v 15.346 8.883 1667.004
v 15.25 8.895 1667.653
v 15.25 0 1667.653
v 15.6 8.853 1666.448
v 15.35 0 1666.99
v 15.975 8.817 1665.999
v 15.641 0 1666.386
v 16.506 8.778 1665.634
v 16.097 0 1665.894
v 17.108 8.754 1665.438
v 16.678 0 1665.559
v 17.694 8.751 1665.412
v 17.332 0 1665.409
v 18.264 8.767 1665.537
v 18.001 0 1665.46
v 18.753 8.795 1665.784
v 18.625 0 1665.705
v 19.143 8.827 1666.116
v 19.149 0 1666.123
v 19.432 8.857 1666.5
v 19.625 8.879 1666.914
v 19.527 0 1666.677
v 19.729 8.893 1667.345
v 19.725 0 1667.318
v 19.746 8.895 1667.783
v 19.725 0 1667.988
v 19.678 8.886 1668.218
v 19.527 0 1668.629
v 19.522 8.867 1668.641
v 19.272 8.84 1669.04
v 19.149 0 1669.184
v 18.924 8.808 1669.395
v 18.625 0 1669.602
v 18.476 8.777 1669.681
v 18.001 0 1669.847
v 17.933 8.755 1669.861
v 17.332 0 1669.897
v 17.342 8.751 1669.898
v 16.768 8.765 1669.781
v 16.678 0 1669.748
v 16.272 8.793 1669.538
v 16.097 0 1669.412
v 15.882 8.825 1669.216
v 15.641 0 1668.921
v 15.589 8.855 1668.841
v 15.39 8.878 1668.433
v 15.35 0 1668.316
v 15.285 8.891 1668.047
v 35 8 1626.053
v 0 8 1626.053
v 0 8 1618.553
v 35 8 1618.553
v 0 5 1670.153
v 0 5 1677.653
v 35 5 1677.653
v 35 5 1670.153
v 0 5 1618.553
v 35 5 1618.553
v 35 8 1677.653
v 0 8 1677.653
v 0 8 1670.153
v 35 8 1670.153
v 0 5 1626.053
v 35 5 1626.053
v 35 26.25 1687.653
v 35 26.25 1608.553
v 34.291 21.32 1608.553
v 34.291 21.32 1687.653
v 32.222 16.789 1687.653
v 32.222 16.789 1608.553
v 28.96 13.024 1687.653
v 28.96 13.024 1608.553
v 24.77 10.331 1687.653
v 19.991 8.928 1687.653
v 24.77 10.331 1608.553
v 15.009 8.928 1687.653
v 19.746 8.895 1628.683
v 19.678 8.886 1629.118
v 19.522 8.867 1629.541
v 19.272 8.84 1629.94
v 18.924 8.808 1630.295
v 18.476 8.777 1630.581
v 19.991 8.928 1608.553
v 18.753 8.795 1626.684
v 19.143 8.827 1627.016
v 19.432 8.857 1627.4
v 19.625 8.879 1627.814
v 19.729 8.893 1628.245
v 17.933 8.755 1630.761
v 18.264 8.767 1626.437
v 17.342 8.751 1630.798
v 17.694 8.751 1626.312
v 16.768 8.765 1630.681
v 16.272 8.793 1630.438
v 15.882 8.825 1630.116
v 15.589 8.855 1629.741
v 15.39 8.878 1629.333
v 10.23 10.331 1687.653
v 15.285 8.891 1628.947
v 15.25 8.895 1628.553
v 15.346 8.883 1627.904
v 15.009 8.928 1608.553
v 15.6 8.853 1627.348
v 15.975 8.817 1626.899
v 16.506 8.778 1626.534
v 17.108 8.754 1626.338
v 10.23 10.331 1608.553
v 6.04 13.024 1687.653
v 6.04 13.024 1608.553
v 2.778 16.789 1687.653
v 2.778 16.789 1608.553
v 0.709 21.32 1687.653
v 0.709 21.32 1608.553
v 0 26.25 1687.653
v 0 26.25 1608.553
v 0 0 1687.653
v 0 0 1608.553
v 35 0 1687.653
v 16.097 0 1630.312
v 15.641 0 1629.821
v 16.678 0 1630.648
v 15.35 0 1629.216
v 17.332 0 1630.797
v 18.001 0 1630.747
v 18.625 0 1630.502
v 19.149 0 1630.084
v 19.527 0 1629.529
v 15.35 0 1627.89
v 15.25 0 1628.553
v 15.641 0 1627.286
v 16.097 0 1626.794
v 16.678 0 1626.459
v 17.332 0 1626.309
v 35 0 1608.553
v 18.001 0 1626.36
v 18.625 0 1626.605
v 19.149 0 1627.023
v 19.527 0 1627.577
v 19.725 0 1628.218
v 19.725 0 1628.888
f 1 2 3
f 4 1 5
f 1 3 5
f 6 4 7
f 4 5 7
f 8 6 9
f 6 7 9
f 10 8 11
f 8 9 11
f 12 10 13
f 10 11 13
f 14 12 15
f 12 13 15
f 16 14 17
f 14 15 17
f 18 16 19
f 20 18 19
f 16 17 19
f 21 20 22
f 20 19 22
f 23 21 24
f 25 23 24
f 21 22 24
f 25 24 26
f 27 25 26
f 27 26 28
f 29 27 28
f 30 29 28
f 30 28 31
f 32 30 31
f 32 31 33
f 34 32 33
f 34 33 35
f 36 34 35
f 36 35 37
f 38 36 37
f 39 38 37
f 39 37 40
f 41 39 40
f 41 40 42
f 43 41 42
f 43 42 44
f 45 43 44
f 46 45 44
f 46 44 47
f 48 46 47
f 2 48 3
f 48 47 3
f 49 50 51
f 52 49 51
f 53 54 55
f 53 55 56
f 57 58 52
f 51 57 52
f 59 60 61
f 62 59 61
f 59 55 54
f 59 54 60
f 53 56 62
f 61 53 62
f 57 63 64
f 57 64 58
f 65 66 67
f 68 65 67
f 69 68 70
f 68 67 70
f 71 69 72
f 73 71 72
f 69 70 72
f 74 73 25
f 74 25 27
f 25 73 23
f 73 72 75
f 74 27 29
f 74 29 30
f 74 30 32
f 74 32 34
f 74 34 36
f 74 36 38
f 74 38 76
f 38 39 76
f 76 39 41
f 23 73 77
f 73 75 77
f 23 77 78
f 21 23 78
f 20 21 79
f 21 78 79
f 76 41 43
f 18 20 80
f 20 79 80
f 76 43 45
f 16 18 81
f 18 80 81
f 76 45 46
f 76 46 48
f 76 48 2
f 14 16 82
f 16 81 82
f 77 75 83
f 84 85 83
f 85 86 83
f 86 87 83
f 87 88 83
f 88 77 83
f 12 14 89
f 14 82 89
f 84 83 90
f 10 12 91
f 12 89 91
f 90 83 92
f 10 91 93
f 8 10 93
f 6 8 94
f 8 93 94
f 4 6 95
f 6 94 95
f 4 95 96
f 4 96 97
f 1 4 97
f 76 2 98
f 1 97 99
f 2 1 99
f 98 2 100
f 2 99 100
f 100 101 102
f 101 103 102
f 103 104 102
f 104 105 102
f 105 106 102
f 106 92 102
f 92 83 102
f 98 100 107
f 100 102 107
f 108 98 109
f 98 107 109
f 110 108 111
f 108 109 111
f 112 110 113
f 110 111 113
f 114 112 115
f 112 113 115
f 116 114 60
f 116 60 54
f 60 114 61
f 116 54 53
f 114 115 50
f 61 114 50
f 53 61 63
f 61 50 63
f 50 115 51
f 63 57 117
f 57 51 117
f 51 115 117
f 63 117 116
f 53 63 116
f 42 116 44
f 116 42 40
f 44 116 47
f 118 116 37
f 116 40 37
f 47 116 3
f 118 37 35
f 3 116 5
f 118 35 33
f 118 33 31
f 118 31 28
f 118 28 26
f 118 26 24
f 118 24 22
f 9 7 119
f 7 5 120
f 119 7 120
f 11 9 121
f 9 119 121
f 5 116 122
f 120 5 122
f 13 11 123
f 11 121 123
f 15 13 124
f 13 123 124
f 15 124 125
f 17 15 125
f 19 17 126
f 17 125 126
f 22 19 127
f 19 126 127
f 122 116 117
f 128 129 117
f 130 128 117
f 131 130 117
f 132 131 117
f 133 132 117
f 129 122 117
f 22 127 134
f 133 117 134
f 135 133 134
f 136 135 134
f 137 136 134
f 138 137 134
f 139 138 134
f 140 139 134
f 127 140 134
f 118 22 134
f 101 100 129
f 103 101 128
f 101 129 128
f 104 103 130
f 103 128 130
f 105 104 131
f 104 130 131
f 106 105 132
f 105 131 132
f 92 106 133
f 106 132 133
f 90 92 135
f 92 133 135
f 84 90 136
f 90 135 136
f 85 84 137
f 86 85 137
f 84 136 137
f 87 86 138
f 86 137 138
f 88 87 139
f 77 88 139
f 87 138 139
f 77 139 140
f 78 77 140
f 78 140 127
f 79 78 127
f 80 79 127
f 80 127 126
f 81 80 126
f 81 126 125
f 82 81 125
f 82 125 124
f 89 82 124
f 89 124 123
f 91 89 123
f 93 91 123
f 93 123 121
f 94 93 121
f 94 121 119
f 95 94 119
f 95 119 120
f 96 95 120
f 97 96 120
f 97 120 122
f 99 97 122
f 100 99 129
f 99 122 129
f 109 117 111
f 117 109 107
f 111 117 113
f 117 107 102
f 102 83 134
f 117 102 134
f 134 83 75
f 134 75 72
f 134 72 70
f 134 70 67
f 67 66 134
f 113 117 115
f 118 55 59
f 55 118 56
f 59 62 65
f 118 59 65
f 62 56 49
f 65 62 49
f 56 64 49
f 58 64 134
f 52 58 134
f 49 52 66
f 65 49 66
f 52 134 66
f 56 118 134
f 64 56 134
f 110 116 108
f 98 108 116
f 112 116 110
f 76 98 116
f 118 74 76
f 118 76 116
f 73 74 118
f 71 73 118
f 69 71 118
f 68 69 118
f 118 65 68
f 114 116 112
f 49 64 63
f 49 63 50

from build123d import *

# Parameters (mm, degrees)
BOSS_EXTRU_1_DEPTH      = 79.1
D_GAGEMENT_M41_D        = 4.5
D_GAGEMENT_M41_DEPTH    = 10
D_GAGEMENT_M41_TIP      = 1.351936393
ESQUISSE7_W             = 7.5
ESQUISSE7_H             = 3
BOSS_EXTRU_3_DEPTH      = 35
ESQUISSE7_2_W           = 7.5
ESQUISSE7_2_H           = 3
ENL_V_MAT_EXTRU_5_DEPTH = 35


with BuildPart() as part:
    # Esquisse1 → Boss.-Extru.1 (new body)
    with BuildSketch(Plane.XY.offset(1608.553140947)):
        with BuildLine():
            Line((0, 0), (35, 0))
            Line((35, 0), (35, 26.25))
            ThreePointArc((35, 26.25), (17.5, 8.75), (0, 26.25))
            Line((0, 26.25), (0, 0))
        make_face()
    extrude(amount=BOSS_EXTRU_1_DEPTH)

    # Dégagement M41
    with Locations(Plane(origin=(17.499999998, 8.75, 1628.553140947), x_dir=(1.0, -1.24e-10, 0), z_dir=(1.24e-10, 1.0, 0))):
        with Locations((0, 0), (2e-09, -39.1)):
            Hole(D_GAGEMENT_M41_D / 2, depth=D_GAGEMENT_M41_DEPTH)
            with Locations((0, 0, -(D_GAGEMENT_M41_DEPTH + D_GAGEMENT_M41_TIP / 2))):  # 118° drill point
                Cone(0, D_GAGEMENT_M41_D / 2, D_GAGEMENT_M41_TIP, mode=Mode.SUBTRACT)

    # Esquisse7 → Boss.-Extru.3 (add)
    with BuildSketch(Plane(origin=(35, 0, 0), x_dir=(0, 0, -1), z_dir=(1, 0, 0))):
        with Locations((-1673.903140947, 6.5)):
            Rectangle(ESQUISSE7_W, ESQUISSE7_H)
        with Locations((-1622.303140947, 6.5)):
            Rectangle(ESQUISSE7_W, ESQUISSE7_H)
    extrude(amount=-BOSS_EXTRU_3_DEPTH)

    # Esquisse7<2> → Enlèv. mat.-Extru.5 (cut)
    with BuildSketch(Plane(origin=(35, 0, 0), x_dir=(0, 0, -1), z_dir=(1, 0, 0))):
        with Locations((-1673.903140947, 6.5)):
            Rectangle(ESQUISSE7_2_W, ESQUISSE7_2_H)
        with Locations((-1622.303140947, 6.5)):
            Rectangle(ESQUISSE7_2_W, ESQUISSE7_2_H)
    extrude(amount=-ENL_V_MAT_EXTRU_5_DEPTH, mode=Mode.SUBTRACT)


solid = part.part
